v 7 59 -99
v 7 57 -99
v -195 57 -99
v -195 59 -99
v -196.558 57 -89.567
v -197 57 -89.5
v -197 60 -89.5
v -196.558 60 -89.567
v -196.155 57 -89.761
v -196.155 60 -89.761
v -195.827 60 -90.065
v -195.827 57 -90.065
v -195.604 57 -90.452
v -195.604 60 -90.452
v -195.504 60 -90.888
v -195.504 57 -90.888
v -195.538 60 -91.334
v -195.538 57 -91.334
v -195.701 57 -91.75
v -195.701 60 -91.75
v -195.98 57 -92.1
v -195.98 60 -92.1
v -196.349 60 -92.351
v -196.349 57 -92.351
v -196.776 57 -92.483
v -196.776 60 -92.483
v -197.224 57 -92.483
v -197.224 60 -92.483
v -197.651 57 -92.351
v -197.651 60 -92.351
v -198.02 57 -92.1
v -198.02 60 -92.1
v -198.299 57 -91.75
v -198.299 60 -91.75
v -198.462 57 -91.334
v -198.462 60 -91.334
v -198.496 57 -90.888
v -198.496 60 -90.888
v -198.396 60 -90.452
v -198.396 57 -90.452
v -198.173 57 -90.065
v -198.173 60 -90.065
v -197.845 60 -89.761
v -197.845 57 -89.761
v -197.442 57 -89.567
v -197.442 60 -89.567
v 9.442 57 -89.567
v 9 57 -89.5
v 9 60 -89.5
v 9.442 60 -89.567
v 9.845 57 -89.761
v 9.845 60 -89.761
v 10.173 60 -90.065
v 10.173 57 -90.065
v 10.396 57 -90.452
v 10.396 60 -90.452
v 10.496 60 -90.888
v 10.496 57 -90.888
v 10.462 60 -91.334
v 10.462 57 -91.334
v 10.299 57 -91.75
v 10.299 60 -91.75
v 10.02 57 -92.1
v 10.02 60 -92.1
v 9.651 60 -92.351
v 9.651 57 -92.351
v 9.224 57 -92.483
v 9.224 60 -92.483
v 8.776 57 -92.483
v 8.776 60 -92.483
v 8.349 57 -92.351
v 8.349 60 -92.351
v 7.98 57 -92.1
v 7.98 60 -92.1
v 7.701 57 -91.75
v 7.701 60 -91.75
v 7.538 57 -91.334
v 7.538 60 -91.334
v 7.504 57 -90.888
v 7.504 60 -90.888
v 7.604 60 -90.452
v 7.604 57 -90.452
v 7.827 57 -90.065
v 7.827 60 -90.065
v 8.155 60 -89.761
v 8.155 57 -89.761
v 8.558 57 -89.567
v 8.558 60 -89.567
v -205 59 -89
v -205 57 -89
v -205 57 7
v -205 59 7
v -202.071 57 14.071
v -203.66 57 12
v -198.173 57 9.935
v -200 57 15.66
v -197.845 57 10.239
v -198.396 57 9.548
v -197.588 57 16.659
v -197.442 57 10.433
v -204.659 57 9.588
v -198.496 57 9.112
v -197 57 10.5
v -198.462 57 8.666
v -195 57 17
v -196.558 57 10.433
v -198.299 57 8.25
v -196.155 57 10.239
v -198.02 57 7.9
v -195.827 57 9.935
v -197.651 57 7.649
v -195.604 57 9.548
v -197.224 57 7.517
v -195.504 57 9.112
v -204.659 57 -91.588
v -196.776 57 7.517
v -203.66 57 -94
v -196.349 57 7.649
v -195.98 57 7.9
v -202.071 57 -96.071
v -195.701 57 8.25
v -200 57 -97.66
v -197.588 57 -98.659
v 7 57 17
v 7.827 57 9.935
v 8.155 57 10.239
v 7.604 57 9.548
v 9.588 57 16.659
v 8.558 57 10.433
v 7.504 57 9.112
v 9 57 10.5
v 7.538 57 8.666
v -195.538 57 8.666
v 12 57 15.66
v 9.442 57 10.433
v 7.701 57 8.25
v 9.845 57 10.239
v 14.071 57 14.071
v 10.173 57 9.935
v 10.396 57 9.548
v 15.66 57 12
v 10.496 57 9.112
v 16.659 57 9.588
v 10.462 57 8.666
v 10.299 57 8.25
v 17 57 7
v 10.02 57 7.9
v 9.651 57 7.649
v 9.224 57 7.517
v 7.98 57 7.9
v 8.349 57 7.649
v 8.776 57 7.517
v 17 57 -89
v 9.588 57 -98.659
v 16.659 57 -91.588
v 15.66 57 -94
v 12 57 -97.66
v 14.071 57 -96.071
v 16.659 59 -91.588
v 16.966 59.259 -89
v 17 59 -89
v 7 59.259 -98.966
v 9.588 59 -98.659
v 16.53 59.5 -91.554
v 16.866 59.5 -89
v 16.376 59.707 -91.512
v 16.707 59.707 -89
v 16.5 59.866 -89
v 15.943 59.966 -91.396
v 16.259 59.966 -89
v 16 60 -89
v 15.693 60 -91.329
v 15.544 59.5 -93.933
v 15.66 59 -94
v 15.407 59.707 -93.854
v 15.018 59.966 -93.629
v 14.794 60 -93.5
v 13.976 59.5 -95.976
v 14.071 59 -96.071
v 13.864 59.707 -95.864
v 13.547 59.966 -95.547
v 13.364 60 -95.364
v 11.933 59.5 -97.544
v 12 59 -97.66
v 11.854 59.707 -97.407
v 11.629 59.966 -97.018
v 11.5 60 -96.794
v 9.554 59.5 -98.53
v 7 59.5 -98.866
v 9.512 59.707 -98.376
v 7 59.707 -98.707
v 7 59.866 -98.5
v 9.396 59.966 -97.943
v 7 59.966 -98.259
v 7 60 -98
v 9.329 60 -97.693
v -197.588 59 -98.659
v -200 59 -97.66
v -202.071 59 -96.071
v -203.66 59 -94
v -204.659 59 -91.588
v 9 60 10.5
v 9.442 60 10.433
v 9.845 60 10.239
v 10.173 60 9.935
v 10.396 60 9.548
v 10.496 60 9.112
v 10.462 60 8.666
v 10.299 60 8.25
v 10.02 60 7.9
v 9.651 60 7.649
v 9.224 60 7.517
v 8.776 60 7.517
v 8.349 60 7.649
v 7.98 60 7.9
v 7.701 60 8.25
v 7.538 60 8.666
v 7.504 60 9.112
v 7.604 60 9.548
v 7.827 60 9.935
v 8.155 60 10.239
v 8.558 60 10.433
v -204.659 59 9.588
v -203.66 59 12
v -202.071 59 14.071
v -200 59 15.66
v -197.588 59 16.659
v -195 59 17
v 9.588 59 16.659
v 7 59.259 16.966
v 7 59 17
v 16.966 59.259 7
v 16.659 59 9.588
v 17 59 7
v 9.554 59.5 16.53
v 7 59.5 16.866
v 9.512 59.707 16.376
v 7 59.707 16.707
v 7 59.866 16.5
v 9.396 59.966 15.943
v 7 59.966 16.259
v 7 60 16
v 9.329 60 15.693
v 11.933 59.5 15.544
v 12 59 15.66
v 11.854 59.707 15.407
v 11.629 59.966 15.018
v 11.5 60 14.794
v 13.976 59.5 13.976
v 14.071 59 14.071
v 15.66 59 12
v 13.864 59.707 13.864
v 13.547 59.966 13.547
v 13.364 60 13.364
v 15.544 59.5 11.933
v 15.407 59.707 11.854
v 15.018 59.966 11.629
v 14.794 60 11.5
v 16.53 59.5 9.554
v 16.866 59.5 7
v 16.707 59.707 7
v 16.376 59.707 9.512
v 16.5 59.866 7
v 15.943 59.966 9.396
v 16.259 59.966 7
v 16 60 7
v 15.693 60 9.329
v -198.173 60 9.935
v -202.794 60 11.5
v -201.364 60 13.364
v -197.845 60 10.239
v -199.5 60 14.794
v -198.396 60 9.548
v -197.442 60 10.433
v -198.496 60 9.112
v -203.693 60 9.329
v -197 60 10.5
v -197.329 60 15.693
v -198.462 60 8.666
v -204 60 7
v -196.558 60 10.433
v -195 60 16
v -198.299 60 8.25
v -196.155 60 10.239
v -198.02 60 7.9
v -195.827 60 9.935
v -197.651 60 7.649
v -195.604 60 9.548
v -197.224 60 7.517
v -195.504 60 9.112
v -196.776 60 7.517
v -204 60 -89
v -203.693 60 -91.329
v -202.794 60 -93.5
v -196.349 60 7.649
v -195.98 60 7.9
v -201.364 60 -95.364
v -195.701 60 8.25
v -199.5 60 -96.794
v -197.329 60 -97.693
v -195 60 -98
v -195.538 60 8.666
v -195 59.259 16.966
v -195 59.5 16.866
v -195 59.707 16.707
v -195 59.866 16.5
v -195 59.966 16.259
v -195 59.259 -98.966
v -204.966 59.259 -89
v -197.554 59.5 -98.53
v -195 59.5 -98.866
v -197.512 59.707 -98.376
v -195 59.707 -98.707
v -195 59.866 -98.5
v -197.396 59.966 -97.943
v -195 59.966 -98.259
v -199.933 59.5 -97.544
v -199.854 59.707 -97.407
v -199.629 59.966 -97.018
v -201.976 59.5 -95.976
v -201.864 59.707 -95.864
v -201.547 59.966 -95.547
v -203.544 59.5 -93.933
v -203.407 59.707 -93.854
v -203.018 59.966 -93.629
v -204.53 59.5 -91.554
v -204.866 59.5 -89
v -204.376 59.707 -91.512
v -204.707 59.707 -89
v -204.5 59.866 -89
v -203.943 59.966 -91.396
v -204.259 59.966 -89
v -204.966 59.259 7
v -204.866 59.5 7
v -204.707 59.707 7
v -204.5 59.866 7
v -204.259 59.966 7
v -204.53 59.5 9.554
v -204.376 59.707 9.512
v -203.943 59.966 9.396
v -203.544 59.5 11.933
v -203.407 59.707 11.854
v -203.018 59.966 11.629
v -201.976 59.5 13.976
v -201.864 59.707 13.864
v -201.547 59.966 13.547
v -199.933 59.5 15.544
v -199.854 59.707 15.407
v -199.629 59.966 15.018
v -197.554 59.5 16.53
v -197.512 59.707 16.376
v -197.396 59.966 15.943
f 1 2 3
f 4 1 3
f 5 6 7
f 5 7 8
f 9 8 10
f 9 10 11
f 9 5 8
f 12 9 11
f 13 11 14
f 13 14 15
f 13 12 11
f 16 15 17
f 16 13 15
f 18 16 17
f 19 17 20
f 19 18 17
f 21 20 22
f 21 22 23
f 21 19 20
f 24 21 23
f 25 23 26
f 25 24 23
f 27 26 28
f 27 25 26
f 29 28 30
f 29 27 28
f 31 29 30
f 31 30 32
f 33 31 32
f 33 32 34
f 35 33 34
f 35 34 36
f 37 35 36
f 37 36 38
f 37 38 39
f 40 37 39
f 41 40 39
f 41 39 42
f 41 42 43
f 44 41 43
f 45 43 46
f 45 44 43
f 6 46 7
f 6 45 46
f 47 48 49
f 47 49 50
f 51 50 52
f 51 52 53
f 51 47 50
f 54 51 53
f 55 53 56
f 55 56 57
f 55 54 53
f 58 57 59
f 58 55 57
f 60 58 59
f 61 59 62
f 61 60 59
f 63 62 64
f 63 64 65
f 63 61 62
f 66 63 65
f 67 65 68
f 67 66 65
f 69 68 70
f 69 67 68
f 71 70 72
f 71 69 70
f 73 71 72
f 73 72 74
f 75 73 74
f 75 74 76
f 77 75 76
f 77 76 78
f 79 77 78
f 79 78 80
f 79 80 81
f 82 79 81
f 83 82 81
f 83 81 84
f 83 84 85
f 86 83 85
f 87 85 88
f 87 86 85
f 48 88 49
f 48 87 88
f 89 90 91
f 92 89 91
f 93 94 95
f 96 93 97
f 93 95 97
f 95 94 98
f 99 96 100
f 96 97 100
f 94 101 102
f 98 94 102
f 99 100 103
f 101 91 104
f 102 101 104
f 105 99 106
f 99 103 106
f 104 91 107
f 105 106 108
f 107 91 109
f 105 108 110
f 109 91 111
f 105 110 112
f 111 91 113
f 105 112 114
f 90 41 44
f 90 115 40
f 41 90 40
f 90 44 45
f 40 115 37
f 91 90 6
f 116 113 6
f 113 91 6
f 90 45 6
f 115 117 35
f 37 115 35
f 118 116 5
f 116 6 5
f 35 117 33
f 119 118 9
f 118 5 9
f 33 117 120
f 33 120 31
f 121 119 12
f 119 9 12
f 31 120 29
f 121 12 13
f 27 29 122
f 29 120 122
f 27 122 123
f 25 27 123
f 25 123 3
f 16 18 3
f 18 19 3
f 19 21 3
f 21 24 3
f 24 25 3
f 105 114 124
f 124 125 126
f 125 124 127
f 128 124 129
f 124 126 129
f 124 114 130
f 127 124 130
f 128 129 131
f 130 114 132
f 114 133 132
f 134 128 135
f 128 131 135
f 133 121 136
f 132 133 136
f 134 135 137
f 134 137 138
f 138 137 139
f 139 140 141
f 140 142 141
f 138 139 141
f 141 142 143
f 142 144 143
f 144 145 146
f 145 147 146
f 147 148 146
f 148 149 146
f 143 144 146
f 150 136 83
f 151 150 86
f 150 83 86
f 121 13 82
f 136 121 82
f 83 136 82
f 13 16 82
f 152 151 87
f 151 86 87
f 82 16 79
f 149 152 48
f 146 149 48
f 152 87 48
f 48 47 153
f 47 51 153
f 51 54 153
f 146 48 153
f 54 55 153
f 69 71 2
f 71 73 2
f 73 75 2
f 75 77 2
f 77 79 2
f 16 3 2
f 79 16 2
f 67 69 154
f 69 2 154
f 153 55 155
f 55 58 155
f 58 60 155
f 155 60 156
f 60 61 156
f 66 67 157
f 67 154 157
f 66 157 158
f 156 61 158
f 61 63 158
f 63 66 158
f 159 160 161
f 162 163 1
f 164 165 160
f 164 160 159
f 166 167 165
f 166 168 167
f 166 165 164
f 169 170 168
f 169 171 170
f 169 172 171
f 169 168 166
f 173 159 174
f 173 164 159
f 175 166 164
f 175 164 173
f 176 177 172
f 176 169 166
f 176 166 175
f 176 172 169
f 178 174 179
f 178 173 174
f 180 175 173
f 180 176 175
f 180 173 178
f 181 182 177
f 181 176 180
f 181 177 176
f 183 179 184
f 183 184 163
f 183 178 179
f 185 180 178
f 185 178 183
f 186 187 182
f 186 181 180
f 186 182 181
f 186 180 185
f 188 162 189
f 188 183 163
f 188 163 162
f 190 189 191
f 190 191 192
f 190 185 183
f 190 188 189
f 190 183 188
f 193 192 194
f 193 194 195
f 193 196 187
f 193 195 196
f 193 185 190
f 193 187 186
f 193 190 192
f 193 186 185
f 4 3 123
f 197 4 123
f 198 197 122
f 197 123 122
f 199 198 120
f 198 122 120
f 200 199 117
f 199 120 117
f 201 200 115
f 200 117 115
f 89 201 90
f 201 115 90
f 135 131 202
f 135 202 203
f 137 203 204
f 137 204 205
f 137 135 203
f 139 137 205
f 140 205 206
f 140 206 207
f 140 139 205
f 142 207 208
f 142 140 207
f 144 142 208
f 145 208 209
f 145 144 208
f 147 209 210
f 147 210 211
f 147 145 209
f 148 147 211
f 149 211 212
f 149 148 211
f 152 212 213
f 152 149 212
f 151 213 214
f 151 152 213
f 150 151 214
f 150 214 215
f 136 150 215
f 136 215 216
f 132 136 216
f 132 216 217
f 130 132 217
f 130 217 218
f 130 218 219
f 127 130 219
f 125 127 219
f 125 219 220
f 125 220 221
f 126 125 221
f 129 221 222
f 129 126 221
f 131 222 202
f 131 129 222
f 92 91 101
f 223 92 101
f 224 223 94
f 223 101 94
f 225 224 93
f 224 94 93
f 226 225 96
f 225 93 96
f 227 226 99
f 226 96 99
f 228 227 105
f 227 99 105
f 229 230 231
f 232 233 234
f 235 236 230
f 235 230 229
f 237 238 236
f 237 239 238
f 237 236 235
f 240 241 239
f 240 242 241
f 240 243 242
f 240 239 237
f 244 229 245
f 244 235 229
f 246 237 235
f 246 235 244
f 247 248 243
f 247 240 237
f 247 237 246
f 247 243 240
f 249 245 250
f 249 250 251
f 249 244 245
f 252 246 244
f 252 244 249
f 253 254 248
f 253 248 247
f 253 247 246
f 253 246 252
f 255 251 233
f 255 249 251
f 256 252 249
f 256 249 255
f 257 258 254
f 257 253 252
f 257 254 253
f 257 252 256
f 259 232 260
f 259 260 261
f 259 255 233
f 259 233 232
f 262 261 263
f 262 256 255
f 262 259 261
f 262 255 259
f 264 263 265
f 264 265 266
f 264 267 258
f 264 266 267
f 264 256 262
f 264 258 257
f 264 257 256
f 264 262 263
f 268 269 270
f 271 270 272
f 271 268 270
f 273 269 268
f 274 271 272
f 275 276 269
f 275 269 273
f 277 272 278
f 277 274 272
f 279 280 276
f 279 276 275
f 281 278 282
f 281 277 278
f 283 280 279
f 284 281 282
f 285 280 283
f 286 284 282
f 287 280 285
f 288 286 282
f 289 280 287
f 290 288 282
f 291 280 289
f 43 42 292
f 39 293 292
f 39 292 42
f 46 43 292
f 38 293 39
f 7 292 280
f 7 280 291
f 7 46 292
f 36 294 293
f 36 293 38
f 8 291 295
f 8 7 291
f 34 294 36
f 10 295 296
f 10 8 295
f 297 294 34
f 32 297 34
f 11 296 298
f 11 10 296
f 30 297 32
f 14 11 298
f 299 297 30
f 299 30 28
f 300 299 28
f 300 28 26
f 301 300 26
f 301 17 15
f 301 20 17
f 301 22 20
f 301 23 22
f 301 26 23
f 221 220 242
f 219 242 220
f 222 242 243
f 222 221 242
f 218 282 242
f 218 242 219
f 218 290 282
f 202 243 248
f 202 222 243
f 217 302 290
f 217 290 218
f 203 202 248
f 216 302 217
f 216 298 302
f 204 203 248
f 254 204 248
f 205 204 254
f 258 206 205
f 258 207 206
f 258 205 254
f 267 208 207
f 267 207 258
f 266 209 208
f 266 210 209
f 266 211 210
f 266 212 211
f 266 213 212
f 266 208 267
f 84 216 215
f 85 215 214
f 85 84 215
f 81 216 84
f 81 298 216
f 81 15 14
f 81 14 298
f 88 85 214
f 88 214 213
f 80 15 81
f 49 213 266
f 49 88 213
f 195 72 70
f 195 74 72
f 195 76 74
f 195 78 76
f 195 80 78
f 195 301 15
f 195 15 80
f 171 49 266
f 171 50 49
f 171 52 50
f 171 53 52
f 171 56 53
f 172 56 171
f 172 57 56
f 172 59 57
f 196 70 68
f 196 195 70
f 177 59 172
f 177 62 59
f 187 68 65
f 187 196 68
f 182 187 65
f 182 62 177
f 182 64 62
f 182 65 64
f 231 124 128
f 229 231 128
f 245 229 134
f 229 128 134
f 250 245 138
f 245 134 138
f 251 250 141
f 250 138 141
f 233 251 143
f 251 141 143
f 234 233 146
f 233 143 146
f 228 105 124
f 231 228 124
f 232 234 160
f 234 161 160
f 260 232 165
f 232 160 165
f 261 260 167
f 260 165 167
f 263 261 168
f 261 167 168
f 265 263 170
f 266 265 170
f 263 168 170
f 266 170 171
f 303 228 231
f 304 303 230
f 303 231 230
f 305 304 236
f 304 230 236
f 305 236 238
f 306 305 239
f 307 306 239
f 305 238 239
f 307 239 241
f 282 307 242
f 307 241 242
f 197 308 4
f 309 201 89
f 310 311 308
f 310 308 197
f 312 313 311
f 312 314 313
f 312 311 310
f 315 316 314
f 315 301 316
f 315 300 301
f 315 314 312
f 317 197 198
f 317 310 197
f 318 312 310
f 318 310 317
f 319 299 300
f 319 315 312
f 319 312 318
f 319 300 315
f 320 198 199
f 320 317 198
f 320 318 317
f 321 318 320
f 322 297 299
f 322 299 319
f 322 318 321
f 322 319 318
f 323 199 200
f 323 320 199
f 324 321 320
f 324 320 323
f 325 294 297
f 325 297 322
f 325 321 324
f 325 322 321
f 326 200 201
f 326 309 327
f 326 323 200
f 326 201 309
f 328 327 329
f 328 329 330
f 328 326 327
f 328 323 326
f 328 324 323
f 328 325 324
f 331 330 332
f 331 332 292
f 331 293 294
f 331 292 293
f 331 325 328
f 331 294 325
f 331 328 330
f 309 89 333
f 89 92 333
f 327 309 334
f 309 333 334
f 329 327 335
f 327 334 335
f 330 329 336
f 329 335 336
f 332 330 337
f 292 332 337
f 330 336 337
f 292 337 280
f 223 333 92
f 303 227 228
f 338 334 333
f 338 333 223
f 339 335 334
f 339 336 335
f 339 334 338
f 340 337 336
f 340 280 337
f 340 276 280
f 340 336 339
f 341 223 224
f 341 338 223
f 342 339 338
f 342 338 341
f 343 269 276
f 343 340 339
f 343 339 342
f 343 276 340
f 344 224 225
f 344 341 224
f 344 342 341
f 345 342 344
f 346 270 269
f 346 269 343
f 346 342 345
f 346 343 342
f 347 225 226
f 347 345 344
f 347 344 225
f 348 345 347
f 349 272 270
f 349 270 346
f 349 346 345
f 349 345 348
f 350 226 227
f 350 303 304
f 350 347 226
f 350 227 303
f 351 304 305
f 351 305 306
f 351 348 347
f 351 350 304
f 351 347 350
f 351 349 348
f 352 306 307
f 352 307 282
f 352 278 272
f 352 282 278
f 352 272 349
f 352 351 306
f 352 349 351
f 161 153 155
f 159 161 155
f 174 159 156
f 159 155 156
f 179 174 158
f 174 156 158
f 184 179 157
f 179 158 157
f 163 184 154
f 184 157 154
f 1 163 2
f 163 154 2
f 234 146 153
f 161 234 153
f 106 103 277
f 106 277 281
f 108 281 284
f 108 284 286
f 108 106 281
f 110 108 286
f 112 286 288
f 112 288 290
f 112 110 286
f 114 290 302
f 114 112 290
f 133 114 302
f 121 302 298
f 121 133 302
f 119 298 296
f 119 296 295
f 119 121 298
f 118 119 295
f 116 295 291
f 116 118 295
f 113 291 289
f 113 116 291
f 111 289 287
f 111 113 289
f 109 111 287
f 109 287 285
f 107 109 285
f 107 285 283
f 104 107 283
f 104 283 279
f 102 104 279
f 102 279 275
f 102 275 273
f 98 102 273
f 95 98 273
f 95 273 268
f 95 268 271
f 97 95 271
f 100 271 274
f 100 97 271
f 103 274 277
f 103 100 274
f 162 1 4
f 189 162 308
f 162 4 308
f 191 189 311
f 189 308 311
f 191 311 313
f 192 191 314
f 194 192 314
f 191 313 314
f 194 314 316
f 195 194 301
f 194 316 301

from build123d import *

# Parameters (mm, degrees)
SKETCH1_R           = 1.5
BOSS_EXTRUDE1_DEPTH = 3
FILLET1_R           = 1


with BuildPart() as part:
    # Sketch1 → Boss-Extrude1 (new body)
    with BuildSketch(Plane(origin=(0, 57, 0), x_dir=(1, 0, 0), z_dir=(0, 1, 0))):
        with BuildLine():
            Line((-31.5, -17), (-26.5, -17))
            Line((-26.5, -17), (7, -17))
            ThreePointArc((7, -17), (14.071067812, -14.071067812), (17, -7))
            Line((17, -7), (17, 89))
            ThreePointArc((17, 89), (14.071067812, 96.071067812), (7, 99))
            Line((7, 99), (-195, 99))
            ThreePointArc((-195, 99), (-202.071067812, 96.071067812), (-205, 89))
            Line((-205, 89), (-205, -7))
            ThreePointArc((-205, -7), (-202.071067812, -14.071067812), (-195, -17))
            Line((-195, -17), (-31.5, -17))
        make_face()
        with Locations(Location((-197, 91, 0), (0, 0, 270))):
            Circle(SKETCH1_R, mode=Mode.SUBTRACT)
        with Locations(Location((9, 91, 0), (0, 0, 270))):
            Circle(SKETCH1_R, mode=Mode.SUBTRACT)
        with Locations(Location((9, -9, 0), (0, 0, 270))):
            Circle(SKETCH1_R, mode=Mode.SUBTRACT)
        with Locations(Location((-197, -9, 0), (0, 0, 270))):
            Circle(SKETCH1_R, mode=Mode.SUBTRACT)
    extrude(amount=BOSS_EXTRUDE1_DEPTH)

    # Fillet1
    fillet1_edges = [part.edges().sort_by_distance(p)[0] for p in [
        (17, 60, -41),
        (14.071067812, 60, -96.071067812),
        (-94, 60, -99),
        (-202.071067812, 60, -96.071067812),
        (-205, 60, -41),
        (-202.071067812, 60, 14.071067812),
        (-94, 60, 17),
        (14.071067812, 60, 14.071067812),
    ]]
    fillet(fillet1_edges, radius=FILLET1_R)


solid = part.part
